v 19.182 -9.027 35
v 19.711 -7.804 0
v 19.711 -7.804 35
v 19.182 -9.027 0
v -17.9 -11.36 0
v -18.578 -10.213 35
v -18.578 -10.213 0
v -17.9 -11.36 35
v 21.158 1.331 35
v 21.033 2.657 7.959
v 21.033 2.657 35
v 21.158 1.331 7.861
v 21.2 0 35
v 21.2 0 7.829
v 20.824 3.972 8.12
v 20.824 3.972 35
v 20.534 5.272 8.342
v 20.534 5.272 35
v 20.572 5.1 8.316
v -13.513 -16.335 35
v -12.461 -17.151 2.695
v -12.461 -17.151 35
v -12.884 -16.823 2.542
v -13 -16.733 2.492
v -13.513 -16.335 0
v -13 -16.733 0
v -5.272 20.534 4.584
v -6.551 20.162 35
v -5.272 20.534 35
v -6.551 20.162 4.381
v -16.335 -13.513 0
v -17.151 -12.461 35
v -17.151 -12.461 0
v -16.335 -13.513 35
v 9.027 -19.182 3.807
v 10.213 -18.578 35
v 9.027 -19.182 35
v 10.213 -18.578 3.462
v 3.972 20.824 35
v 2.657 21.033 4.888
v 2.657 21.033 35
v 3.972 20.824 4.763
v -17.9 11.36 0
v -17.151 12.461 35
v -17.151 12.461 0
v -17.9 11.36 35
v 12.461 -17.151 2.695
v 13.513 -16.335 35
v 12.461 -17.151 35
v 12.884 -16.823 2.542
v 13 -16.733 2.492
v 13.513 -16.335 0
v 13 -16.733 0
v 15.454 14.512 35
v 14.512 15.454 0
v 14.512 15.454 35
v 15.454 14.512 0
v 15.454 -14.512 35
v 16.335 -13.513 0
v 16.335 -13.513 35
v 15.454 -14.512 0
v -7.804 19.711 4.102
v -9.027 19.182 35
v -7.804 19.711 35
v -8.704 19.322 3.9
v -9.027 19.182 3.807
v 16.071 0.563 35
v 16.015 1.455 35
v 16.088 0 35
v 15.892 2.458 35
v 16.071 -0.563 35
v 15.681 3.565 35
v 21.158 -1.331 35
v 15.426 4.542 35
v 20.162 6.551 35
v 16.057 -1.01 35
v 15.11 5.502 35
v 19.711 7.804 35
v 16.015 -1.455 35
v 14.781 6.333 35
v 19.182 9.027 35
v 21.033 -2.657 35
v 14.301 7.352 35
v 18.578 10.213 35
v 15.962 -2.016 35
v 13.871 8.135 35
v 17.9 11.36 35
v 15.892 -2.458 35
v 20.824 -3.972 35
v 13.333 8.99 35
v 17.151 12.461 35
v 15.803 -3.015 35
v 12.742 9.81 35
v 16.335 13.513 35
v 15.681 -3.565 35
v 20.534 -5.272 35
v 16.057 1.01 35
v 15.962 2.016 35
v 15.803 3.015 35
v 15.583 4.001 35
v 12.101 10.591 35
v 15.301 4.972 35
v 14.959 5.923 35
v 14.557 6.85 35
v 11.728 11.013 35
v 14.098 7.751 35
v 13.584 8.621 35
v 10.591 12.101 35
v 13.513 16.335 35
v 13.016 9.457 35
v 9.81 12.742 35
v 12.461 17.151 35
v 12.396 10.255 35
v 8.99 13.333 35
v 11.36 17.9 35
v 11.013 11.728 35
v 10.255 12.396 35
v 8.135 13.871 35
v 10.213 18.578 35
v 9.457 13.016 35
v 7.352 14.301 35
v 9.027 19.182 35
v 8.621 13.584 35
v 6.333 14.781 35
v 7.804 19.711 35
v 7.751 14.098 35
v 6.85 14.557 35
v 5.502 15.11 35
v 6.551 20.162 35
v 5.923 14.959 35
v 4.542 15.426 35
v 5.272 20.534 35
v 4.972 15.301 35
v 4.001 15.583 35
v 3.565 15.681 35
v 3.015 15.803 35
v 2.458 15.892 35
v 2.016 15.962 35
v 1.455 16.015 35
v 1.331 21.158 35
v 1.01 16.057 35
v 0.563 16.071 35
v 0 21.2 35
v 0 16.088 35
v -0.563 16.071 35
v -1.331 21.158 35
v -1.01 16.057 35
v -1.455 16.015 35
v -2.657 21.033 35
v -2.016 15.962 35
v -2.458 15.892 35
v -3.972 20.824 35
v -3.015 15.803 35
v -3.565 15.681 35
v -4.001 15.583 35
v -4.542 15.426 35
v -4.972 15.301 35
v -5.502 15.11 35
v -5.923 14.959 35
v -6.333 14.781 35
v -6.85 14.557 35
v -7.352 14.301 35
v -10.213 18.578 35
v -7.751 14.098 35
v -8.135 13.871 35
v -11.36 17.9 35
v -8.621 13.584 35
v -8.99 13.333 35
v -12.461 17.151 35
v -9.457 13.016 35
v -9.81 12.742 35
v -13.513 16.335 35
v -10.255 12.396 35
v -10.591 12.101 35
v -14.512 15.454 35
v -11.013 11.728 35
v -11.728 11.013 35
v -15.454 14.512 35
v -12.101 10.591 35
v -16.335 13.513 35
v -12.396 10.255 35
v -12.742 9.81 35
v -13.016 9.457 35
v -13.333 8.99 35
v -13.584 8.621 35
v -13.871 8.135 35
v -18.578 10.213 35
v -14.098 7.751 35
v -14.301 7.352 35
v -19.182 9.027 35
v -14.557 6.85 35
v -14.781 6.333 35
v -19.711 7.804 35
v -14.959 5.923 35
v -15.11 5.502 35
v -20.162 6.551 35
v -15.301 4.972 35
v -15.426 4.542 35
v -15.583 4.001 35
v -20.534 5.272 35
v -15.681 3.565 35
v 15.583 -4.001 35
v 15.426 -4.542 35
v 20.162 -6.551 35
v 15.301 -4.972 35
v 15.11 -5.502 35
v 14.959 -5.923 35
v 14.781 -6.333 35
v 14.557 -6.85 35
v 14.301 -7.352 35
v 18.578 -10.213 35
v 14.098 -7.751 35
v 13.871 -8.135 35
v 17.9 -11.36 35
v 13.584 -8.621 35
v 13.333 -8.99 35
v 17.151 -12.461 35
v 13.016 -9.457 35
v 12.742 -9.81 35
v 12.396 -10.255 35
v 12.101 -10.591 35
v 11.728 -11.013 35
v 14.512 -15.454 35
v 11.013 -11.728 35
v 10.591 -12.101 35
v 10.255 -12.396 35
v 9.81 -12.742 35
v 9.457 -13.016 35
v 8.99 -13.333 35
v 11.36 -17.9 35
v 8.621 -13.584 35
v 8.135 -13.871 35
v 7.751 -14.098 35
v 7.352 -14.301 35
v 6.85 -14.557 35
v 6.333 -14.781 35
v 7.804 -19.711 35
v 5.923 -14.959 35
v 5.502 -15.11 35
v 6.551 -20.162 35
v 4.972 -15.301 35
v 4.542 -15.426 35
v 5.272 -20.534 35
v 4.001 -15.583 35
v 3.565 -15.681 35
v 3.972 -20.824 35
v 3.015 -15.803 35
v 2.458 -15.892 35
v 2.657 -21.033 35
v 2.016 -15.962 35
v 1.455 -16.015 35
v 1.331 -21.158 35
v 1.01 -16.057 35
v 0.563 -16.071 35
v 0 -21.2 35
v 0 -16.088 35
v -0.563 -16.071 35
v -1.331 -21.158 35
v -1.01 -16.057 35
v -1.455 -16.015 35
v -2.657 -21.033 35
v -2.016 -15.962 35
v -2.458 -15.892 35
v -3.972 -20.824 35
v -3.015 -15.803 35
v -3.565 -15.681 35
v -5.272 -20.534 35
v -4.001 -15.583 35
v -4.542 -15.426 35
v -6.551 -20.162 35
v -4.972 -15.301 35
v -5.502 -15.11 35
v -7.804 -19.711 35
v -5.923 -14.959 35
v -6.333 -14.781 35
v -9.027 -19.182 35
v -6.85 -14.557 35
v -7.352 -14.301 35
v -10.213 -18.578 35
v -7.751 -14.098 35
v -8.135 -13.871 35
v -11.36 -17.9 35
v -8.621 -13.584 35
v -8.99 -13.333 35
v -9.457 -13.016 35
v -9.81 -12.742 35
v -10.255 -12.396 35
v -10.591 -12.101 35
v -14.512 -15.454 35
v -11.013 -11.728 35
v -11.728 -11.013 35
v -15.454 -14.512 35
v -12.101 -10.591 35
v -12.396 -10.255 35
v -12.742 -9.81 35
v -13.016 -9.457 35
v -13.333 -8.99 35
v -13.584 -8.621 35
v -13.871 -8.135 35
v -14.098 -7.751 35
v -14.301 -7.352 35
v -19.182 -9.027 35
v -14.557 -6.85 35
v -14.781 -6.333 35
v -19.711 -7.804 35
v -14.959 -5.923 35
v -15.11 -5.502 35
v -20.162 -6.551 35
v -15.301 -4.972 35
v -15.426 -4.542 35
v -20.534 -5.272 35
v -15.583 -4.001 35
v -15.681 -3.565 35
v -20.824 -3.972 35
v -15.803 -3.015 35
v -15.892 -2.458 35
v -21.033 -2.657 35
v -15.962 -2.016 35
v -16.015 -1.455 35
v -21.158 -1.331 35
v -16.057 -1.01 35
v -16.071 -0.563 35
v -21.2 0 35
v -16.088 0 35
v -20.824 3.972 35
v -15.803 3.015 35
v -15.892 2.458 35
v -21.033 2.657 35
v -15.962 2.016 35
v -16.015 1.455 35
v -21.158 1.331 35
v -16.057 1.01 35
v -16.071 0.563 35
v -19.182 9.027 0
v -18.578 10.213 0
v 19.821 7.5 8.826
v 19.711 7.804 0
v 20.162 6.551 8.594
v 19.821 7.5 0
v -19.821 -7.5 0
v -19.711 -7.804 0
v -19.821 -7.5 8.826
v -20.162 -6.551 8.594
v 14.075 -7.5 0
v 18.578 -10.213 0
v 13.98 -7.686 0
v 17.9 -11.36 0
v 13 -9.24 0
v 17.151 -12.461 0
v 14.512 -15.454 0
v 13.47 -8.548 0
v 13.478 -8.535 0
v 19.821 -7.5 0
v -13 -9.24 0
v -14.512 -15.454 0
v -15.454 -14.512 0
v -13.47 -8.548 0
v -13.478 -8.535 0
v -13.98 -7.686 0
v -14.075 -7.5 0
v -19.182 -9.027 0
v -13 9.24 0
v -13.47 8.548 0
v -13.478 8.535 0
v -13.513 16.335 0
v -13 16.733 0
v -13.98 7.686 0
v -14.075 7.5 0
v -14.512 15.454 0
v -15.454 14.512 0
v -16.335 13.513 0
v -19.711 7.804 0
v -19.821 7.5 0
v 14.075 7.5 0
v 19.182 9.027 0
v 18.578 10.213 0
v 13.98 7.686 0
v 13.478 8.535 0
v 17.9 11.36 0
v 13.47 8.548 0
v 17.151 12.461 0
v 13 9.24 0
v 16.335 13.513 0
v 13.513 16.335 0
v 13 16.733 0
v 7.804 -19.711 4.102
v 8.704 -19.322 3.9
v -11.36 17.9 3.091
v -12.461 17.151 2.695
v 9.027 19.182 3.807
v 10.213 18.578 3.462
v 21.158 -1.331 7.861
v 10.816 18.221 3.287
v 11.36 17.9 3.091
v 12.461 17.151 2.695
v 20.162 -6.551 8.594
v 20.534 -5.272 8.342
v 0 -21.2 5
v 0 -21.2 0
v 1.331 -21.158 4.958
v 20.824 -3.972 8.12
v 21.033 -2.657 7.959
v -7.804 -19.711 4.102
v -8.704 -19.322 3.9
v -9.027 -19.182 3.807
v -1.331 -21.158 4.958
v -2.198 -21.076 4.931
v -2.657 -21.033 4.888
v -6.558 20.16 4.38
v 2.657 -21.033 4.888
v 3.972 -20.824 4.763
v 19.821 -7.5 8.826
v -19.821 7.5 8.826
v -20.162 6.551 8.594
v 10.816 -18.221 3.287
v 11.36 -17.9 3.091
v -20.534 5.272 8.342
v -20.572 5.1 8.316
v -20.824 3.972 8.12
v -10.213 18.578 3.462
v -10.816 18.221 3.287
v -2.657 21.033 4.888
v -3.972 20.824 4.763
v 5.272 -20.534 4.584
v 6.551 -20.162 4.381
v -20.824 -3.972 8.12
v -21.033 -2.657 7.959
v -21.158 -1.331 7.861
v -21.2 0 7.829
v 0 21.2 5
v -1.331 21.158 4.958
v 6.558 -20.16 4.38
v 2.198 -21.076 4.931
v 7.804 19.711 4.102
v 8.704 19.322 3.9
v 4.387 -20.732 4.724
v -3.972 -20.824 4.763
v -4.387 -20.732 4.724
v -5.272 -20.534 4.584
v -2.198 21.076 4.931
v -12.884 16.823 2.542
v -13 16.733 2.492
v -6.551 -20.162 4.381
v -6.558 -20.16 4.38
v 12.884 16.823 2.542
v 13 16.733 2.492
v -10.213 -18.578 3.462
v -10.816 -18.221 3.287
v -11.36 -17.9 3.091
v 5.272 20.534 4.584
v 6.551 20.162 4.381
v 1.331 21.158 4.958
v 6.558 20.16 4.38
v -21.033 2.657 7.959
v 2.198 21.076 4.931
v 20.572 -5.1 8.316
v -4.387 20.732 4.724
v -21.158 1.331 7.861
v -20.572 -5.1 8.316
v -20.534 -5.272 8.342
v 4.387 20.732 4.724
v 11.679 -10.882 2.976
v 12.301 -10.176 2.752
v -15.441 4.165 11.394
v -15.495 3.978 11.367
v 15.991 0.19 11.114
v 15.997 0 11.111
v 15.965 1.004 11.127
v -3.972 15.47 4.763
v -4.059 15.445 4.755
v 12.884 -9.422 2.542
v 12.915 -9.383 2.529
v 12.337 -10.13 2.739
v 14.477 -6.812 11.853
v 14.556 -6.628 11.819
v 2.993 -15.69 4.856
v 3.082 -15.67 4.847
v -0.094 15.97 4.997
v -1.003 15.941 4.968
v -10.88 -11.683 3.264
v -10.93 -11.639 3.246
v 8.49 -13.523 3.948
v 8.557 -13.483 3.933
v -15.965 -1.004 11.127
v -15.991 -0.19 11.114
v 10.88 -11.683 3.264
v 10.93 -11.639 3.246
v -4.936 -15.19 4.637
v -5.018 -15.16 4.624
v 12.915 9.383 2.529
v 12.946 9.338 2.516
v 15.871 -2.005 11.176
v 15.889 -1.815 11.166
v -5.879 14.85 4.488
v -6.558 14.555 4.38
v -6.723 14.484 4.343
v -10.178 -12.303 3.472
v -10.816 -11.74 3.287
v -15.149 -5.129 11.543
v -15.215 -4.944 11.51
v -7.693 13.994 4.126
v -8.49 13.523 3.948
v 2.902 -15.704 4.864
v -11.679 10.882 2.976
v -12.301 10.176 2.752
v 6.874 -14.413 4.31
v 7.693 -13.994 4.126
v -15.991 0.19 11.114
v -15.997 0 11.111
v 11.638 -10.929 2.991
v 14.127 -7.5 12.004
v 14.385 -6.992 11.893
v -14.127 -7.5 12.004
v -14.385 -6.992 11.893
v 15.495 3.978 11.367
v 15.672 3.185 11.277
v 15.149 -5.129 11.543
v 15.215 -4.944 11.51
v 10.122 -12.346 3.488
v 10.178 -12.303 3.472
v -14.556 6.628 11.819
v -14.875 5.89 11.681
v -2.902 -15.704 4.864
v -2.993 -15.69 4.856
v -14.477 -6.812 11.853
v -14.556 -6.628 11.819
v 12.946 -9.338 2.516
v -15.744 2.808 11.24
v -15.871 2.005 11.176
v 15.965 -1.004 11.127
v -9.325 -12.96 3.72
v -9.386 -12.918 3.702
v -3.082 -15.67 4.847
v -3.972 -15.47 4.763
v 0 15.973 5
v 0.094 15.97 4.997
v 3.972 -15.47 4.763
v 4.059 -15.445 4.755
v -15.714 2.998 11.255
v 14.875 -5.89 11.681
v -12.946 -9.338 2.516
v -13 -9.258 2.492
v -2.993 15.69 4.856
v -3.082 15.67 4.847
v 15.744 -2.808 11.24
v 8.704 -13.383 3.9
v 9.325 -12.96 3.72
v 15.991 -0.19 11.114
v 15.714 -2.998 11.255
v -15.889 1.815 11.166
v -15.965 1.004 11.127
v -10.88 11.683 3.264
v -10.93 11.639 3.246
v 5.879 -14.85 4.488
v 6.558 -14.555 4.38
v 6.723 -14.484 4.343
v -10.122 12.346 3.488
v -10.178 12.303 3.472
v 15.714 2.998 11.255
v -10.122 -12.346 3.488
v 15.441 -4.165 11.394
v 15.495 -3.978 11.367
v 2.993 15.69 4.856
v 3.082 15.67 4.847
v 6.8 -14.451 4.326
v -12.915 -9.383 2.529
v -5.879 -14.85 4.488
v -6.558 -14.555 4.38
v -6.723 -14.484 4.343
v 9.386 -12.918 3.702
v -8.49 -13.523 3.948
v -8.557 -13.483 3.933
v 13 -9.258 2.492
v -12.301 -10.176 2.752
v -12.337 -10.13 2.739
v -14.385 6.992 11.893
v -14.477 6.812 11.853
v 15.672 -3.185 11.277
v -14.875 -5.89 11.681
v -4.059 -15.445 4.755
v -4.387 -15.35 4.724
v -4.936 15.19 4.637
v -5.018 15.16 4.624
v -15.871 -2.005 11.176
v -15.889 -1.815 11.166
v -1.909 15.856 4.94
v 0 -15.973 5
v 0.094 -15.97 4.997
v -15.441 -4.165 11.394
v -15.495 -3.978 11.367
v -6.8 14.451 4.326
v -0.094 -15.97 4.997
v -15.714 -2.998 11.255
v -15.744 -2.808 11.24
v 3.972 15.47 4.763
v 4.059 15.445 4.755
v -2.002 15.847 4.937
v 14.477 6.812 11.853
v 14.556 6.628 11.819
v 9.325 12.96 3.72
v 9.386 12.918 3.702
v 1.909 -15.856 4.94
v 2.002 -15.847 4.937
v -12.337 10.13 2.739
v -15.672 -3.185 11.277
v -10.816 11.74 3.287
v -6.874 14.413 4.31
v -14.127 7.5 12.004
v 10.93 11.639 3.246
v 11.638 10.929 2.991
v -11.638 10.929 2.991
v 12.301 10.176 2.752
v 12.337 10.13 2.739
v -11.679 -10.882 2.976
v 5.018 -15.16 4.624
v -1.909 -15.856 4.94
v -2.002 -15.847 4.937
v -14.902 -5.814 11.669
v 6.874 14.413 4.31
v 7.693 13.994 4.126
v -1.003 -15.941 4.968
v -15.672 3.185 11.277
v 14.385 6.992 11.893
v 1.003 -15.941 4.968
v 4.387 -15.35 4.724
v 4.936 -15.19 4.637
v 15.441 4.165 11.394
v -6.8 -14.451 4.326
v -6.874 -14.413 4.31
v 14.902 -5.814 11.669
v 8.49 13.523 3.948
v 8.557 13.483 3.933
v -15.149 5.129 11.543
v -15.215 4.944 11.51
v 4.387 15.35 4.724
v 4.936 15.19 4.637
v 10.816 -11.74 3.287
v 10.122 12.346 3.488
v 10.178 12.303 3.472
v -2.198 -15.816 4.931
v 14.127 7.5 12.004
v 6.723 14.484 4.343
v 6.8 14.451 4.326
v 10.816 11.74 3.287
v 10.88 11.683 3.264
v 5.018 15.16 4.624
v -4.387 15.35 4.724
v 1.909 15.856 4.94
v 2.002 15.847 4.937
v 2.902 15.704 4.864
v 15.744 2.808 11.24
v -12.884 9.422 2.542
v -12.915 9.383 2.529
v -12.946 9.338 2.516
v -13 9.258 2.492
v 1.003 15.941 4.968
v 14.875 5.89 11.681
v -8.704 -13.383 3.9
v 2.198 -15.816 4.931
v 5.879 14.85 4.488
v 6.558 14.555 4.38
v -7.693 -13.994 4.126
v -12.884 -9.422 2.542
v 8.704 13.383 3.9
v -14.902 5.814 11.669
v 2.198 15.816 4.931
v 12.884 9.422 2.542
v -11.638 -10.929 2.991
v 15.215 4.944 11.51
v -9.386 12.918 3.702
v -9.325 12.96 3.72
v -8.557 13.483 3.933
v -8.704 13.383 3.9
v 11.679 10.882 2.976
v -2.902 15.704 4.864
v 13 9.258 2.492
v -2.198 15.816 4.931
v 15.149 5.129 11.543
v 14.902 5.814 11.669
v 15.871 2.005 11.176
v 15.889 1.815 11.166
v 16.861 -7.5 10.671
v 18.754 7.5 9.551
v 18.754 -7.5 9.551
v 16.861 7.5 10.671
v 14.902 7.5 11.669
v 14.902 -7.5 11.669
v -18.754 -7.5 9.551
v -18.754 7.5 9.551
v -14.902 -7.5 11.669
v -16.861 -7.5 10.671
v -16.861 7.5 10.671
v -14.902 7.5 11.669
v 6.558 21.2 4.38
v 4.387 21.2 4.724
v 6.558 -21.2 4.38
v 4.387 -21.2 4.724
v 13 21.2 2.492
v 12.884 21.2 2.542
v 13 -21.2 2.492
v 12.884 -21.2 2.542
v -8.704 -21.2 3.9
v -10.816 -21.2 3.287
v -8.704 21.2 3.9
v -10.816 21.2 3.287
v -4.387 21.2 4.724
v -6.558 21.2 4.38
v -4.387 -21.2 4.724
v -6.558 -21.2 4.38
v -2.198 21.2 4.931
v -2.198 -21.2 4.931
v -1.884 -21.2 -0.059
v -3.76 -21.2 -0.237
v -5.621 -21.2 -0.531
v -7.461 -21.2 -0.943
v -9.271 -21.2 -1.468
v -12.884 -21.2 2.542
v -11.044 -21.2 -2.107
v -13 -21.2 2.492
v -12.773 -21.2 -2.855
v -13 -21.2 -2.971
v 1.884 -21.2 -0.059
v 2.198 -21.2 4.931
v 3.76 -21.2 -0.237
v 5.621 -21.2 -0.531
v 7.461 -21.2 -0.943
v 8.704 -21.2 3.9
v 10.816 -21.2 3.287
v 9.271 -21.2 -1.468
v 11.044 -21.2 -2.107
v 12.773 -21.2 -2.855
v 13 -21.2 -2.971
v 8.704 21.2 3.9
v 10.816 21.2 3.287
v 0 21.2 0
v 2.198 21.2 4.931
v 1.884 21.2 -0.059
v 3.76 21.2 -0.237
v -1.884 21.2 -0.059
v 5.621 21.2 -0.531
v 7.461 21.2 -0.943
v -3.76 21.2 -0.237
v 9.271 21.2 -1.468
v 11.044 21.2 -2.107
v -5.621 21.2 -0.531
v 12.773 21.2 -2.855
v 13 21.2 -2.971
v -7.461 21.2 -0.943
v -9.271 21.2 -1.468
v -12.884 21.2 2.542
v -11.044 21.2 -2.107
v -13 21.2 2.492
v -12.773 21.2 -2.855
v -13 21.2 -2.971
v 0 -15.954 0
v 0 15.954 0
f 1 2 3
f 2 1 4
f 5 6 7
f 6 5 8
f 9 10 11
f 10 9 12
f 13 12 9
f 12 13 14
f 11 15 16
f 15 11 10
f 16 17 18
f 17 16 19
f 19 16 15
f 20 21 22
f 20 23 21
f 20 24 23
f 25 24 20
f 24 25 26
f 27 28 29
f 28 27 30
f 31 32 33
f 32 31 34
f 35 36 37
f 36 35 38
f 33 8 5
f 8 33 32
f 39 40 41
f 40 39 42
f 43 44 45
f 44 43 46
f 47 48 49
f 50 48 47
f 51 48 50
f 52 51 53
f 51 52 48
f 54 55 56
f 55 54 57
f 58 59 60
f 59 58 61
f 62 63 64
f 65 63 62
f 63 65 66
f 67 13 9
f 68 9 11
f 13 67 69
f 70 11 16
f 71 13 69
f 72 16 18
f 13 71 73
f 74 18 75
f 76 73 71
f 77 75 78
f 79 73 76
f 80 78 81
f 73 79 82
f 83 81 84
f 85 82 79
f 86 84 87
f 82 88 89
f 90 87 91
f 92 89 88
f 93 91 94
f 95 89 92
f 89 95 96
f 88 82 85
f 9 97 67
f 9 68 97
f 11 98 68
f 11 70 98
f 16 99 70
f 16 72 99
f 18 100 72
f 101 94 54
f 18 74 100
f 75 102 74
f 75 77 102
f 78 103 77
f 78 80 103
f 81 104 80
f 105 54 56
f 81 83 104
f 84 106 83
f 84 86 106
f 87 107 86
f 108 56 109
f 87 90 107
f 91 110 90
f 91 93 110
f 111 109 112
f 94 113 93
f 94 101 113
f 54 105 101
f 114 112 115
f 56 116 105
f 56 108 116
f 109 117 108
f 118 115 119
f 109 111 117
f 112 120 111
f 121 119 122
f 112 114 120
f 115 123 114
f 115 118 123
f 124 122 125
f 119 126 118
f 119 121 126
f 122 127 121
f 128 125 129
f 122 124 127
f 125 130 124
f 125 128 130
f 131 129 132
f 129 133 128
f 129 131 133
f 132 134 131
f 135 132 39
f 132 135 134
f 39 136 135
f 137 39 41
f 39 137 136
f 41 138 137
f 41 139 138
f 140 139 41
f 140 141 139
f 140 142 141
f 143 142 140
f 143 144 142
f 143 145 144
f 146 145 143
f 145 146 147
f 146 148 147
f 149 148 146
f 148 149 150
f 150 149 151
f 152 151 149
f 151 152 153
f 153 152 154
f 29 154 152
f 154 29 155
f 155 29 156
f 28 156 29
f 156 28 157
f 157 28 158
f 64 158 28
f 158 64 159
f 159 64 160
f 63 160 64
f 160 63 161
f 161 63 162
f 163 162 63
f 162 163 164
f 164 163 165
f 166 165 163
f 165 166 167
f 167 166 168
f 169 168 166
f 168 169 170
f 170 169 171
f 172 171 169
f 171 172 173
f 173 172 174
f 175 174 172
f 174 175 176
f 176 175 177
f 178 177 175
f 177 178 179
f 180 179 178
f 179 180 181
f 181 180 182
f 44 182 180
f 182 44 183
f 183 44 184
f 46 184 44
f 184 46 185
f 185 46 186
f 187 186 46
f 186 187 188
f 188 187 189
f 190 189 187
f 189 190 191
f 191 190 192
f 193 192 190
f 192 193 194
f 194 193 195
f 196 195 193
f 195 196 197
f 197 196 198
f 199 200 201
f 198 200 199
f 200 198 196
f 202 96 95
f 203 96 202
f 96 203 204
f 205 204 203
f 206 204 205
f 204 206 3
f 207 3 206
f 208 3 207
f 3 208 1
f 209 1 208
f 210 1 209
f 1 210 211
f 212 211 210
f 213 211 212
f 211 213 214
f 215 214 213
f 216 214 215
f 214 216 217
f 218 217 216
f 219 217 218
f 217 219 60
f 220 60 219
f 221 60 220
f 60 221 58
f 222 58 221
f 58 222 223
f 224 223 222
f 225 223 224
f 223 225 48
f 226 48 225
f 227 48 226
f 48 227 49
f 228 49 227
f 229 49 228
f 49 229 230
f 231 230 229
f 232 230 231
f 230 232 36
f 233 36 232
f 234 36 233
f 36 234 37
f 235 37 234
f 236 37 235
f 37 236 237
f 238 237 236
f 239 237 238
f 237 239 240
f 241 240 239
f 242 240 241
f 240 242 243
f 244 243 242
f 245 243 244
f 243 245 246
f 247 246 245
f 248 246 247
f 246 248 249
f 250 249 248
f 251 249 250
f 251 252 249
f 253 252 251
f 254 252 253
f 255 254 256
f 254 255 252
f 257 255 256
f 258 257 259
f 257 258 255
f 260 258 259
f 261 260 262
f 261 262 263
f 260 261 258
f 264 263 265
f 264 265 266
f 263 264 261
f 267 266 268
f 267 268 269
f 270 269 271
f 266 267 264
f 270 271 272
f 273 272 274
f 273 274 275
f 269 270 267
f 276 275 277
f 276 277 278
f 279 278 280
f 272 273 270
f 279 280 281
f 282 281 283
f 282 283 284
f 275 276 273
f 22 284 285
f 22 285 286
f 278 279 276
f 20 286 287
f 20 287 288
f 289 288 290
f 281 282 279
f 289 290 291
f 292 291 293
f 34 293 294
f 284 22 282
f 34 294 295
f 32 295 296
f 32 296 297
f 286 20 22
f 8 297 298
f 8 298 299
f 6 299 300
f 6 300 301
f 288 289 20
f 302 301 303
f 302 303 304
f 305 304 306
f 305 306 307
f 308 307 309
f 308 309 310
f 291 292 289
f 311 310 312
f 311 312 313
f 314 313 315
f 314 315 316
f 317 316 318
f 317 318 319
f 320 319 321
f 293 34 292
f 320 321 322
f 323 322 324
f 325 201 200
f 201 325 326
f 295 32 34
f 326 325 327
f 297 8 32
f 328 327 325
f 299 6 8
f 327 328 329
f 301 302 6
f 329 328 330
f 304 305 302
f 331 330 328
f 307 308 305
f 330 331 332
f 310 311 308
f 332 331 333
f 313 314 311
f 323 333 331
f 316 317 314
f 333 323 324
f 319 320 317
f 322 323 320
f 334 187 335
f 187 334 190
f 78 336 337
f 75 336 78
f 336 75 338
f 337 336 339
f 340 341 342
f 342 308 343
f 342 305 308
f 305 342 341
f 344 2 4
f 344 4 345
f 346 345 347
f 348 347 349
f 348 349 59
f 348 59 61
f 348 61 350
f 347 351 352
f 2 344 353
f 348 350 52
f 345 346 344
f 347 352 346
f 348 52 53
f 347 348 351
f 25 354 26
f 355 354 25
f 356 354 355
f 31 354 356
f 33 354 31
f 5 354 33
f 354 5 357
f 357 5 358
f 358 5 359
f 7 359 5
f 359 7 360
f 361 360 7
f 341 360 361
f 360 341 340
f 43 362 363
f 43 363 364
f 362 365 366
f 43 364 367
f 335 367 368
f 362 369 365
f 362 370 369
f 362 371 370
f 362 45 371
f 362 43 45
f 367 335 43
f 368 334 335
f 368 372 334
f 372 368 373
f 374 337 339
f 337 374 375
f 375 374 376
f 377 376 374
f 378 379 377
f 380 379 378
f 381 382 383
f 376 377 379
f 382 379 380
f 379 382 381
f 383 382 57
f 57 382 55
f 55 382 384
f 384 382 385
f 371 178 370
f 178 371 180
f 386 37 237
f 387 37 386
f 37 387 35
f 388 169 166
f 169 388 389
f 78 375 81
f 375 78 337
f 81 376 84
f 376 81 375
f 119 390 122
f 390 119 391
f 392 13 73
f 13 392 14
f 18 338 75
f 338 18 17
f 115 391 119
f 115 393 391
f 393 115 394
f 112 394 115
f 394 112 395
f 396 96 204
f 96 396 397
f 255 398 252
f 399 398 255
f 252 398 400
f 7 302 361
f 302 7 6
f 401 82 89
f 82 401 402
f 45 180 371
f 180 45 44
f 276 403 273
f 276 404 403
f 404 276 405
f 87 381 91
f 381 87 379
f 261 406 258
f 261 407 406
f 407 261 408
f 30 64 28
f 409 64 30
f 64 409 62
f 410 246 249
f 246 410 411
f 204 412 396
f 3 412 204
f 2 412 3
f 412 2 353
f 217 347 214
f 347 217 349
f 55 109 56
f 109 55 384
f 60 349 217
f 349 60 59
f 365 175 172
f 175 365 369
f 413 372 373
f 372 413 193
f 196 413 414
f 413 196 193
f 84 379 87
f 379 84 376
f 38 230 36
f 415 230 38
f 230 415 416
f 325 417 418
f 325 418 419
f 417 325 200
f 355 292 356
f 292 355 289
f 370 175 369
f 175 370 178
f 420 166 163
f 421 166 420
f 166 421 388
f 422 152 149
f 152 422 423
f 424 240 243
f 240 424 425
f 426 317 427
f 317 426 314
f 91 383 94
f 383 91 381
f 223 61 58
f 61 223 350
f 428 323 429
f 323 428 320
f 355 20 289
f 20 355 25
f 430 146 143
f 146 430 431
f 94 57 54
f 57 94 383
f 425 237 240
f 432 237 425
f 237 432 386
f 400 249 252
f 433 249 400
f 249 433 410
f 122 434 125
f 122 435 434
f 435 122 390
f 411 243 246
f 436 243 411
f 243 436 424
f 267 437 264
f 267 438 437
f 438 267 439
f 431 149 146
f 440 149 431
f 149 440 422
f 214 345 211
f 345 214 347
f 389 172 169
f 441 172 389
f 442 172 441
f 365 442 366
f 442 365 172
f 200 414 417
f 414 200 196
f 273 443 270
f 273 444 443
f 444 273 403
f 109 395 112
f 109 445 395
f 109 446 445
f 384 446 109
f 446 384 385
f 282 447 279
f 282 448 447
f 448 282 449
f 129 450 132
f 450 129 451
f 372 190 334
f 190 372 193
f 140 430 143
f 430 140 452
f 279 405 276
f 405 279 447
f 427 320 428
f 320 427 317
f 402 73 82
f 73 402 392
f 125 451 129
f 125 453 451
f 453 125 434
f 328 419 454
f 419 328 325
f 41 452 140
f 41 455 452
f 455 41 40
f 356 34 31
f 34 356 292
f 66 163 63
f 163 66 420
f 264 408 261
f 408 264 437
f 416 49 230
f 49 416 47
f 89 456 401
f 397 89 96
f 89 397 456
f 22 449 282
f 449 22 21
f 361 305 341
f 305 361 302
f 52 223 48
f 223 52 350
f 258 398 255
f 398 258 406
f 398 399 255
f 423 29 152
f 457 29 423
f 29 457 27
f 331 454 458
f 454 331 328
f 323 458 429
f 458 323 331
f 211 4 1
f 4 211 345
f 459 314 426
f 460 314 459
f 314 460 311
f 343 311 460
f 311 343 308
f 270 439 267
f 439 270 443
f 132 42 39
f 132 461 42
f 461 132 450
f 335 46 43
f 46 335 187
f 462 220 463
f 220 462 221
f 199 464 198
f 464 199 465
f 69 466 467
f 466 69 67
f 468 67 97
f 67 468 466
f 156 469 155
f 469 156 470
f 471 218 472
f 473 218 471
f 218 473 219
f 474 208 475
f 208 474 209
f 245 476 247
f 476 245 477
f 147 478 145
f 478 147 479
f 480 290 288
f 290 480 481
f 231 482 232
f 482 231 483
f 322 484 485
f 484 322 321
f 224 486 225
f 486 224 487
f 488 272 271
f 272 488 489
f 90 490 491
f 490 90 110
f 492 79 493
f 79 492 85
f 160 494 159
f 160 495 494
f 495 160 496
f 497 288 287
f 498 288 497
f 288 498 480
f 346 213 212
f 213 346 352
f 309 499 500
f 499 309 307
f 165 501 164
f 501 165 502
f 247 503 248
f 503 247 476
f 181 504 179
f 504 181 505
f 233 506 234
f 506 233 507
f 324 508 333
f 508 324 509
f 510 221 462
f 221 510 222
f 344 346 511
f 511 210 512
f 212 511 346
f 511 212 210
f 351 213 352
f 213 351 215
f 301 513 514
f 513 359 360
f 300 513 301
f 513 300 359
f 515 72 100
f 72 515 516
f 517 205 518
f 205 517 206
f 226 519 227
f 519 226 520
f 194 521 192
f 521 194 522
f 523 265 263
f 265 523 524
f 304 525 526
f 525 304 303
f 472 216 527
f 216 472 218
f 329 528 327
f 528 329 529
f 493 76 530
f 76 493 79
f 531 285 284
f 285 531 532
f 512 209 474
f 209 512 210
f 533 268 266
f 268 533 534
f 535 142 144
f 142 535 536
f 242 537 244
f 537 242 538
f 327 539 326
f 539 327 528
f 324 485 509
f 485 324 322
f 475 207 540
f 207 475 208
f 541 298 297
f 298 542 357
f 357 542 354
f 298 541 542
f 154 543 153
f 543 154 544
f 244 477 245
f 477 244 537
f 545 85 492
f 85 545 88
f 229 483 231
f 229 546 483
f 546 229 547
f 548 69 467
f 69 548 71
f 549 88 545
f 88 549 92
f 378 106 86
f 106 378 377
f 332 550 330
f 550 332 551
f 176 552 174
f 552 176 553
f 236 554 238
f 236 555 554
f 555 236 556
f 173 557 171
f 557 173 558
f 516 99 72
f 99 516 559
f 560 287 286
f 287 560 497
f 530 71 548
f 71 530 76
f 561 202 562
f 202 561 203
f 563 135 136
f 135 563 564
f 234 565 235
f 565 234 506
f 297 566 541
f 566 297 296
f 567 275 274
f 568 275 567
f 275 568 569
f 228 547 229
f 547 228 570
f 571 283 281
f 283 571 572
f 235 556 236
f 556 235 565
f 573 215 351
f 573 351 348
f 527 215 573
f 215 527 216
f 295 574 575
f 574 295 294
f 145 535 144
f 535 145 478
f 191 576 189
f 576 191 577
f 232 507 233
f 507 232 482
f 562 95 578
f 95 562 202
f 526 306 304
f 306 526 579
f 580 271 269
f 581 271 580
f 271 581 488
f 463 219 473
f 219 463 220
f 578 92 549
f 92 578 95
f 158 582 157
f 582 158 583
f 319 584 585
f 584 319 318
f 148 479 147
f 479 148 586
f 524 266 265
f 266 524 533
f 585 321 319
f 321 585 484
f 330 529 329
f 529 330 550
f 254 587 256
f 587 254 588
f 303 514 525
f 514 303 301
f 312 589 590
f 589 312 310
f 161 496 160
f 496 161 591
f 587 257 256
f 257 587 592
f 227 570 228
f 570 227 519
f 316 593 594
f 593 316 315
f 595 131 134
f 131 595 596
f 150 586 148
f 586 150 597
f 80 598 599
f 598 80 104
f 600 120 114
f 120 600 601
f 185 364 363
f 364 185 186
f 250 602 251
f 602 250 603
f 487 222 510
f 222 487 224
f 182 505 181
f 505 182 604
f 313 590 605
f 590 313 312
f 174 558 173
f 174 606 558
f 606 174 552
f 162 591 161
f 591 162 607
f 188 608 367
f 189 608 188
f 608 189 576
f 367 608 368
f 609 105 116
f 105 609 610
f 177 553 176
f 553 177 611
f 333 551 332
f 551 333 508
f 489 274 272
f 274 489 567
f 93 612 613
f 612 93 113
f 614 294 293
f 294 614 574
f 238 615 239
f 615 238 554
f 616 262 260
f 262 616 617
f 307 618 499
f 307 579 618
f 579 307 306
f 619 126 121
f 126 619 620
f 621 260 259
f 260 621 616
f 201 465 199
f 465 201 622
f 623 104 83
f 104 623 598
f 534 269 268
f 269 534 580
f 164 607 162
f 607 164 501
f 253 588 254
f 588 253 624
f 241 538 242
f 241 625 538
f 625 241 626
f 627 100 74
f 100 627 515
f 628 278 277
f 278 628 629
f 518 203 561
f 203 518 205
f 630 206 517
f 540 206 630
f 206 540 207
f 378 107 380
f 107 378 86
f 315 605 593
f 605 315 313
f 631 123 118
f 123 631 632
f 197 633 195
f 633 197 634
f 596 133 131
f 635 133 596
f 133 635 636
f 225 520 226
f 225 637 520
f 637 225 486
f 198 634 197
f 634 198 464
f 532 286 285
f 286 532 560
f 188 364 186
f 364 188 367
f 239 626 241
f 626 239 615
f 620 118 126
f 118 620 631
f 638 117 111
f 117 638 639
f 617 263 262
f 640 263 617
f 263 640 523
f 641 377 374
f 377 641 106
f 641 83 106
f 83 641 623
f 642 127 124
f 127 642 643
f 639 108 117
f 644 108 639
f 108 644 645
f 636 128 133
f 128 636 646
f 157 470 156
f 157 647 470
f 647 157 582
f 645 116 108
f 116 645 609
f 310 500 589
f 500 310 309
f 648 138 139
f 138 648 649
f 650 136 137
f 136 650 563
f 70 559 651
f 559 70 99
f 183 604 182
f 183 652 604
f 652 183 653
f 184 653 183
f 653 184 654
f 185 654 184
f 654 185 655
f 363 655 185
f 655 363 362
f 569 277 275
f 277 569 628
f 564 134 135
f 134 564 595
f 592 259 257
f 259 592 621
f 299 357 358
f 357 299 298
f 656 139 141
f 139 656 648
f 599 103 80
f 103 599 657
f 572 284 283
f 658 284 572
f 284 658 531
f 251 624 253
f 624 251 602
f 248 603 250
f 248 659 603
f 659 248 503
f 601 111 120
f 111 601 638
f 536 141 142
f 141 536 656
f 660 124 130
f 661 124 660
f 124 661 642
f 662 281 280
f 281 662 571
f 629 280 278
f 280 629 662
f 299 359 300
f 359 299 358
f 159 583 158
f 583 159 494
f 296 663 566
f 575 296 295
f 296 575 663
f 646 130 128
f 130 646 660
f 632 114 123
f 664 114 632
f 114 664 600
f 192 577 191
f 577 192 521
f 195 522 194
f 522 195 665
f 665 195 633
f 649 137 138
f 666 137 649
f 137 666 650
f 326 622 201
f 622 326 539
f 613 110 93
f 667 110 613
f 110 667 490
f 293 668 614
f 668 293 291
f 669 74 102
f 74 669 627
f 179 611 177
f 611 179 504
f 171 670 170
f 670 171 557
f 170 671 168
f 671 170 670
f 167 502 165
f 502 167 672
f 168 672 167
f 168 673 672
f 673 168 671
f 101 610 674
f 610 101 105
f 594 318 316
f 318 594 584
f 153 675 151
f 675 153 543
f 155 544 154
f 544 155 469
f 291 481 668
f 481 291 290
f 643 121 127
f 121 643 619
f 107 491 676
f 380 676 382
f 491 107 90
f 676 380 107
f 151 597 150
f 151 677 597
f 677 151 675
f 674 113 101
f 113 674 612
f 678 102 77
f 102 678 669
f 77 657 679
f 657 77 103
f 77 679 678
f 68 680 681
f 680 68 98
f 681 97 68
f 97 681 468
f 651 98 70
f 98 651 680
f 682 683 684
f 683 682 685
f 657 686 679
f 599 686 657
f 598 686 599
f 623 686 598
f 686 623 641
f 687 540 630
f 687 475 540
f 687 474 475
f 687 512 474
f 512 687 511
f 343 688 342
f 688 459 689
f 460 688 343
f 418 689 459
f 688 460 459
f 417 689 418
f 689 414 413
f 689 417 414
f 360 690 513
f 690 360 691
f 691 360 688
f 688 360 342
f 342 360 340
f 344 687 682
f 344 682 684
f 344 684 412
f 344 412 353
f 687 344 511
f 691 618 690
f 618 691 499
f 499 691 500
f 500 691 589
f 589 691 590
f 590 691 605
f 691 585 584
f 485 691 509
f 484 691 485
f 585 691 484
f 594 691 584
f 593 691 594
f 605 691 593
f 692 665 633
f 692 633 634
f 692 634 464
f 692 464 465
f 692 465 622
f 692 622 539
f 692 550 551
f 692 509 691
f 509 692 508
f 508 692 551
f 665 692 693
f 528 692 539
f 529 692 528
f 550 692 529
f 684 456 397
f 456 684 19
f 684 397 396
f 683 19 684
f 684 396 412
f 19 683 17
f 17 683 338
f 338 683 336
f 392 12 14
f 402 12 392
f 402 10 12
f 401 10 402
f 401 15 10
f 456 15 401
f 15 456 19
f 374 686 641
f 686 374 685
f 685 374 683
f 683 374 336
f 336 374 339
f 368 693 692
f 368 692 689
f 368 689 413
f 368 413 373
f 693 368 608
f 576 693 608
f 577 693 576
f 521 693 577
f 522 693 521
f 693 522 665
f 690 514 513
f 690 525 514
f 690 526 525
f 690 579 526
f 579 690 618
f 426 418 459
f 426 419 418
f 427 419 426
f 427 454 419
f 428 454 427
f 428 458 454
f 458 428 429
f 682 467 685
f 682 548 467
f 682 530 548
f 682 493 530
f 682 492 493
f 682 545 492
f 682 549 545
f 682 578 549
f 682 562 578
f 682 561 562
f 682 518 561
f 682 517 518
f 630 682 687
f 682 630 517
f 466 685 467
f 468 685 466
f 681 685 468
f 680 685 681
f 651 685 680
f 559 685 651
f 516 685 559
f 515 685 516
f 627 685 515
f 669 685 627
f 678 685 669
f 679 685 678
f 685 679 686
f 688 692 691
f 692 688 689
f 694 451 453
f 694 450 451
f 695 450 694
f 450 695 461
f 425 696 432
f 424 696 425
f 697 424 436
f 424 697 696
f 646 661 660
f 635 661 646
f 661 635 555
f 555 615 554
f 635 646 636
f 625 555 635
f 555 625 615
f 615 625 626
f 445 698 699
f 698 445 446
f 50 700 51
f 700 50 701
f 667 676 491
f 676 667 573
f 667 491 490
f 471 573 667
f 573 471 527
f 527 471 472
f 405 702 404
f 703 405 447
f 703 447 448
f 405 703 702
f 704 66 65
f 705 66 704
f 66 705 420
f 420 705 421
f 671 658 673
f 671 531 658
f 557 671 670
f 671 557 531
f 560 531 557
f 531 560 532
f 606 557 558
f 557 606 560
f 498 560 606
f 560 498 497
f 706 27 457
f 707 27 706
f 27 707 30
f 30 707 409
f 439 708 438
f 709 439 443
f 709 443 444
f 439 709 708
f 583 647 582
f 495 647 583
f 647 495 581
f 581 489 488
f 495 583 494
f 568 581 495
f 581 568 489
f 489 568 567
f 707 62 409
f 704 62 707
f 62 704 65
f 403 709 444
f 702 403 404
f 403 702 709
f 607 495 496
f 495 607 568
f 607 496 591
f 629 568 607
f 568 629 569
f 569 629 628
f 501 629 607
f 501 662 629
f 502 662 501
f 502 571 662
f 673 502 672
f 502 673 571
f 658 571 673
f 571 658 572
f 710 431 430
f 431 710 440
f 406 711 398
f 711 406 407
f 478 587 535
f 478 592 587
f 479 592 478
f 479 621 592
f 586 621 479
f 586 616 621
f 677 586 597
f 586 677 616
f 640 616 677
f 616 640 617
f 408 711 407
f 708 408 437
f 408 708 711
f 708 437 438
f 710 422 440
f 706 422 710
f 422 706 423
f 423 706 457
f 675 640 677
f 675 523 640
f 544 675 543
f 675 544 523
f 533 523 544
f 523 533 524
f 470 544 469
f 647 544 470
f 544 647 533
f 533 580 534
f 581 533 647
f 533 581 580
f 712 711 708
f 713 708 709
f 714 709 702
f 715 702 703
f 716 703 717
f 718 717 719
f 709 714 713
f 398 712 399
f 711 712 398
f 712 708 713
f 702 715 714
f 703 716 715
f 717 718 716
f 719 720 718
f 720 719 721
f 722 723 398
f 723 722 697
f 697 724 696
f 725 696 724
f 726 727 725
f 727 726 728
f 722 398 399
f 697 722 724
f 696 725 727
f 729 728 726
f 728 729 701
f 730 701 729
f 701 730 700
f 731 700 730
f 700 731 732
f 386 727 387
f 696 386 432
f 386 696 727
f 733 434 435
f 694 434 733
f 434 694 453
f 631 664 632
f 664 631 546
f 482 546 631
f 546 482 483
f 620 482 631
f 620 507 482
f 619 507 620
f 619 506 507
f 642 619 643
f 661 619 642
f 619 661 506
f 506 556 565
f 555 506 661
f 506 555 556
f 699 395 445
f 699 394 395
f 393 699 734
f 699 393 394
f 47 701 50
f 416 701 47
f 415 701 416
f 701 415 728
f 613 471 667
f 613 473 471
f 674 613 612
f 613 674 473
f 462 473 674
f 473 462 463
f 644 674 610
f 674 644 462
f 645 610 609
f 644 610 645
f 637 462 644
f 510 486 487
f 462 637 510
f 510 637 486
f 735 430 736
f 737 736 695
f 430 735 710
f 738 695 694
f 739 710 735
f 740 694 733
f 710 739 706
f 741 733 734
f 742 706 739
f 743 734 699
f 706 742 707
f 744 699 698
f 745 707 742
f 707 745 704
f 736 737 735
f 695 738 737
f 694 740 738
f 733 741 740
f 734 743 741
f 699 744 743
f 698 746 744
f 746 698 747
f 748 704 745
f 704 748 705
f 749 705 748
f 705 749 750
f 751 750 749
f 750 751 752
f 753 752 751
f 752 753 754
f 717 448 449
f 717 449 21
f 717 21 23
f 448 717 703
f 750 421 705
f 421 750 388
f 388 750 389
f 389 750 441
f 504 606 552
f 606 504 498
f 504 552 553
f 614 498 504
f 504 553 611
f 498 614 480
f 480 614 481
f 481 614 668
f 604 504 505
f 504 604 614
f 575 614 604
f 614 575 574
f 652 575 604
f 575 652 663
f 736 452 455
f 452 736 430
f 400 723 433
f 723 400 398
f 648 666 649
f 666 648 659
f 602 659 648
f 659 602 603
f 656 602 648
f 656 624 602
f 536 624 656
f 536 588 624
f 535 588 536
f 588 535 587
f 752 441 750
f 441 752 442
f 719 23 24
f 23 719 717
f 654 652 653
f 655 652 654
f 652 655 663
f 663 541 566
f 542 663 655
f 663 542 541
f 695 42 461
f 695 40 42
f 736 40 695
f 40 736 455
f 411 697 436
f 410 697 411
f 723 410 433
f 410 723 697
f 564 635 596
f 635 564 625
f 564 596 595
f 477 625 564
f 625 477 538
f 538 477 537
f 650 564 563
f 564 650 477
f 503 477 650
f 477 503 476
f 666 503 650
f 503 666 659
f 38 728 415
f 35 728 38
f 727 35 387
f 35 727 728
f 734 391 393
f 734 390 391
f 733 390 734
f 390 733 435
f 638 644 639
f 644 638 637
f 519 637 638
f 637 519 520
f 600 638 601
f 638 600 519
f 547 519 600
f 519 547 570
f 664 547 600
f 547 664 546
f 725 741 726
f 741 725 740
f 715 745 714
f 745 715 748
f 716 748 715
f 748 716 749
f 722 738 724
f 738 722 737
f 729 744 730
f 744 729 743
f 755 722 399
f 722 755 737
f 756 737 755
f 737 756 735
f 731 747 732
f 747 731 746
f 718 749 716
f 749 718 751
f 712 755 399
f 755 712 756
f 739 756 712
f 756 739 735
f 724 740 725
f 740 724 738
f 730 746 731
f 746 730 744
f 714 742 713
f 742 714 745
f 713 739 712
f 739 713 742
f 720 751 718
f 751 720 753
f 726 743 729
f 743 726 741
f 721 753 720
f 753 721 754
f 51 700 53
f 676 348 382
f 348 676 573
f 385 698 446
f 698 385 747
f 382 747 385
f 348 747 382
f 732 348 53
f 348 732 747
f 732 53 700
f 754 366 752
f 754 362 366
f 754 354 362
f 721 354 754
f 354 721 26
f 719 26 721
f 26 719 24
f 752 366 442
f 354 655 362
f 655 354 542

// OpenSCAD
// universal clamp for pipe


$fn=100;

PR=16.2;    //enter pvc pipe radius here (for standard 1" PVC, PR=16.90;for 32mm PR= 16.2)

//pipe socket
difference(){
    cylinder(35,PR+5,PR+5);
    translate([0,0,-1]) cylinder(65,PR-0.25,PR);
    rotate([90,0,0]) translate([0,-20,-7.5]) cylinder(15,35,35);
    }

//hose clamp rim
translate ([0,PR+5,-30]) rotate([90,0,0]) difference(){
    cylinder((PR+5)*2,35,35); 
    translate([0,0,-5]) cylinder(60,30,30); 
    translate([-70,-173,-5]) cube([200,200,200]); 
    translate([13,-163,-5]) cube([200,200,200]); 
    translate([-63,-163,-5]) cube([50,200,200]); 
}
